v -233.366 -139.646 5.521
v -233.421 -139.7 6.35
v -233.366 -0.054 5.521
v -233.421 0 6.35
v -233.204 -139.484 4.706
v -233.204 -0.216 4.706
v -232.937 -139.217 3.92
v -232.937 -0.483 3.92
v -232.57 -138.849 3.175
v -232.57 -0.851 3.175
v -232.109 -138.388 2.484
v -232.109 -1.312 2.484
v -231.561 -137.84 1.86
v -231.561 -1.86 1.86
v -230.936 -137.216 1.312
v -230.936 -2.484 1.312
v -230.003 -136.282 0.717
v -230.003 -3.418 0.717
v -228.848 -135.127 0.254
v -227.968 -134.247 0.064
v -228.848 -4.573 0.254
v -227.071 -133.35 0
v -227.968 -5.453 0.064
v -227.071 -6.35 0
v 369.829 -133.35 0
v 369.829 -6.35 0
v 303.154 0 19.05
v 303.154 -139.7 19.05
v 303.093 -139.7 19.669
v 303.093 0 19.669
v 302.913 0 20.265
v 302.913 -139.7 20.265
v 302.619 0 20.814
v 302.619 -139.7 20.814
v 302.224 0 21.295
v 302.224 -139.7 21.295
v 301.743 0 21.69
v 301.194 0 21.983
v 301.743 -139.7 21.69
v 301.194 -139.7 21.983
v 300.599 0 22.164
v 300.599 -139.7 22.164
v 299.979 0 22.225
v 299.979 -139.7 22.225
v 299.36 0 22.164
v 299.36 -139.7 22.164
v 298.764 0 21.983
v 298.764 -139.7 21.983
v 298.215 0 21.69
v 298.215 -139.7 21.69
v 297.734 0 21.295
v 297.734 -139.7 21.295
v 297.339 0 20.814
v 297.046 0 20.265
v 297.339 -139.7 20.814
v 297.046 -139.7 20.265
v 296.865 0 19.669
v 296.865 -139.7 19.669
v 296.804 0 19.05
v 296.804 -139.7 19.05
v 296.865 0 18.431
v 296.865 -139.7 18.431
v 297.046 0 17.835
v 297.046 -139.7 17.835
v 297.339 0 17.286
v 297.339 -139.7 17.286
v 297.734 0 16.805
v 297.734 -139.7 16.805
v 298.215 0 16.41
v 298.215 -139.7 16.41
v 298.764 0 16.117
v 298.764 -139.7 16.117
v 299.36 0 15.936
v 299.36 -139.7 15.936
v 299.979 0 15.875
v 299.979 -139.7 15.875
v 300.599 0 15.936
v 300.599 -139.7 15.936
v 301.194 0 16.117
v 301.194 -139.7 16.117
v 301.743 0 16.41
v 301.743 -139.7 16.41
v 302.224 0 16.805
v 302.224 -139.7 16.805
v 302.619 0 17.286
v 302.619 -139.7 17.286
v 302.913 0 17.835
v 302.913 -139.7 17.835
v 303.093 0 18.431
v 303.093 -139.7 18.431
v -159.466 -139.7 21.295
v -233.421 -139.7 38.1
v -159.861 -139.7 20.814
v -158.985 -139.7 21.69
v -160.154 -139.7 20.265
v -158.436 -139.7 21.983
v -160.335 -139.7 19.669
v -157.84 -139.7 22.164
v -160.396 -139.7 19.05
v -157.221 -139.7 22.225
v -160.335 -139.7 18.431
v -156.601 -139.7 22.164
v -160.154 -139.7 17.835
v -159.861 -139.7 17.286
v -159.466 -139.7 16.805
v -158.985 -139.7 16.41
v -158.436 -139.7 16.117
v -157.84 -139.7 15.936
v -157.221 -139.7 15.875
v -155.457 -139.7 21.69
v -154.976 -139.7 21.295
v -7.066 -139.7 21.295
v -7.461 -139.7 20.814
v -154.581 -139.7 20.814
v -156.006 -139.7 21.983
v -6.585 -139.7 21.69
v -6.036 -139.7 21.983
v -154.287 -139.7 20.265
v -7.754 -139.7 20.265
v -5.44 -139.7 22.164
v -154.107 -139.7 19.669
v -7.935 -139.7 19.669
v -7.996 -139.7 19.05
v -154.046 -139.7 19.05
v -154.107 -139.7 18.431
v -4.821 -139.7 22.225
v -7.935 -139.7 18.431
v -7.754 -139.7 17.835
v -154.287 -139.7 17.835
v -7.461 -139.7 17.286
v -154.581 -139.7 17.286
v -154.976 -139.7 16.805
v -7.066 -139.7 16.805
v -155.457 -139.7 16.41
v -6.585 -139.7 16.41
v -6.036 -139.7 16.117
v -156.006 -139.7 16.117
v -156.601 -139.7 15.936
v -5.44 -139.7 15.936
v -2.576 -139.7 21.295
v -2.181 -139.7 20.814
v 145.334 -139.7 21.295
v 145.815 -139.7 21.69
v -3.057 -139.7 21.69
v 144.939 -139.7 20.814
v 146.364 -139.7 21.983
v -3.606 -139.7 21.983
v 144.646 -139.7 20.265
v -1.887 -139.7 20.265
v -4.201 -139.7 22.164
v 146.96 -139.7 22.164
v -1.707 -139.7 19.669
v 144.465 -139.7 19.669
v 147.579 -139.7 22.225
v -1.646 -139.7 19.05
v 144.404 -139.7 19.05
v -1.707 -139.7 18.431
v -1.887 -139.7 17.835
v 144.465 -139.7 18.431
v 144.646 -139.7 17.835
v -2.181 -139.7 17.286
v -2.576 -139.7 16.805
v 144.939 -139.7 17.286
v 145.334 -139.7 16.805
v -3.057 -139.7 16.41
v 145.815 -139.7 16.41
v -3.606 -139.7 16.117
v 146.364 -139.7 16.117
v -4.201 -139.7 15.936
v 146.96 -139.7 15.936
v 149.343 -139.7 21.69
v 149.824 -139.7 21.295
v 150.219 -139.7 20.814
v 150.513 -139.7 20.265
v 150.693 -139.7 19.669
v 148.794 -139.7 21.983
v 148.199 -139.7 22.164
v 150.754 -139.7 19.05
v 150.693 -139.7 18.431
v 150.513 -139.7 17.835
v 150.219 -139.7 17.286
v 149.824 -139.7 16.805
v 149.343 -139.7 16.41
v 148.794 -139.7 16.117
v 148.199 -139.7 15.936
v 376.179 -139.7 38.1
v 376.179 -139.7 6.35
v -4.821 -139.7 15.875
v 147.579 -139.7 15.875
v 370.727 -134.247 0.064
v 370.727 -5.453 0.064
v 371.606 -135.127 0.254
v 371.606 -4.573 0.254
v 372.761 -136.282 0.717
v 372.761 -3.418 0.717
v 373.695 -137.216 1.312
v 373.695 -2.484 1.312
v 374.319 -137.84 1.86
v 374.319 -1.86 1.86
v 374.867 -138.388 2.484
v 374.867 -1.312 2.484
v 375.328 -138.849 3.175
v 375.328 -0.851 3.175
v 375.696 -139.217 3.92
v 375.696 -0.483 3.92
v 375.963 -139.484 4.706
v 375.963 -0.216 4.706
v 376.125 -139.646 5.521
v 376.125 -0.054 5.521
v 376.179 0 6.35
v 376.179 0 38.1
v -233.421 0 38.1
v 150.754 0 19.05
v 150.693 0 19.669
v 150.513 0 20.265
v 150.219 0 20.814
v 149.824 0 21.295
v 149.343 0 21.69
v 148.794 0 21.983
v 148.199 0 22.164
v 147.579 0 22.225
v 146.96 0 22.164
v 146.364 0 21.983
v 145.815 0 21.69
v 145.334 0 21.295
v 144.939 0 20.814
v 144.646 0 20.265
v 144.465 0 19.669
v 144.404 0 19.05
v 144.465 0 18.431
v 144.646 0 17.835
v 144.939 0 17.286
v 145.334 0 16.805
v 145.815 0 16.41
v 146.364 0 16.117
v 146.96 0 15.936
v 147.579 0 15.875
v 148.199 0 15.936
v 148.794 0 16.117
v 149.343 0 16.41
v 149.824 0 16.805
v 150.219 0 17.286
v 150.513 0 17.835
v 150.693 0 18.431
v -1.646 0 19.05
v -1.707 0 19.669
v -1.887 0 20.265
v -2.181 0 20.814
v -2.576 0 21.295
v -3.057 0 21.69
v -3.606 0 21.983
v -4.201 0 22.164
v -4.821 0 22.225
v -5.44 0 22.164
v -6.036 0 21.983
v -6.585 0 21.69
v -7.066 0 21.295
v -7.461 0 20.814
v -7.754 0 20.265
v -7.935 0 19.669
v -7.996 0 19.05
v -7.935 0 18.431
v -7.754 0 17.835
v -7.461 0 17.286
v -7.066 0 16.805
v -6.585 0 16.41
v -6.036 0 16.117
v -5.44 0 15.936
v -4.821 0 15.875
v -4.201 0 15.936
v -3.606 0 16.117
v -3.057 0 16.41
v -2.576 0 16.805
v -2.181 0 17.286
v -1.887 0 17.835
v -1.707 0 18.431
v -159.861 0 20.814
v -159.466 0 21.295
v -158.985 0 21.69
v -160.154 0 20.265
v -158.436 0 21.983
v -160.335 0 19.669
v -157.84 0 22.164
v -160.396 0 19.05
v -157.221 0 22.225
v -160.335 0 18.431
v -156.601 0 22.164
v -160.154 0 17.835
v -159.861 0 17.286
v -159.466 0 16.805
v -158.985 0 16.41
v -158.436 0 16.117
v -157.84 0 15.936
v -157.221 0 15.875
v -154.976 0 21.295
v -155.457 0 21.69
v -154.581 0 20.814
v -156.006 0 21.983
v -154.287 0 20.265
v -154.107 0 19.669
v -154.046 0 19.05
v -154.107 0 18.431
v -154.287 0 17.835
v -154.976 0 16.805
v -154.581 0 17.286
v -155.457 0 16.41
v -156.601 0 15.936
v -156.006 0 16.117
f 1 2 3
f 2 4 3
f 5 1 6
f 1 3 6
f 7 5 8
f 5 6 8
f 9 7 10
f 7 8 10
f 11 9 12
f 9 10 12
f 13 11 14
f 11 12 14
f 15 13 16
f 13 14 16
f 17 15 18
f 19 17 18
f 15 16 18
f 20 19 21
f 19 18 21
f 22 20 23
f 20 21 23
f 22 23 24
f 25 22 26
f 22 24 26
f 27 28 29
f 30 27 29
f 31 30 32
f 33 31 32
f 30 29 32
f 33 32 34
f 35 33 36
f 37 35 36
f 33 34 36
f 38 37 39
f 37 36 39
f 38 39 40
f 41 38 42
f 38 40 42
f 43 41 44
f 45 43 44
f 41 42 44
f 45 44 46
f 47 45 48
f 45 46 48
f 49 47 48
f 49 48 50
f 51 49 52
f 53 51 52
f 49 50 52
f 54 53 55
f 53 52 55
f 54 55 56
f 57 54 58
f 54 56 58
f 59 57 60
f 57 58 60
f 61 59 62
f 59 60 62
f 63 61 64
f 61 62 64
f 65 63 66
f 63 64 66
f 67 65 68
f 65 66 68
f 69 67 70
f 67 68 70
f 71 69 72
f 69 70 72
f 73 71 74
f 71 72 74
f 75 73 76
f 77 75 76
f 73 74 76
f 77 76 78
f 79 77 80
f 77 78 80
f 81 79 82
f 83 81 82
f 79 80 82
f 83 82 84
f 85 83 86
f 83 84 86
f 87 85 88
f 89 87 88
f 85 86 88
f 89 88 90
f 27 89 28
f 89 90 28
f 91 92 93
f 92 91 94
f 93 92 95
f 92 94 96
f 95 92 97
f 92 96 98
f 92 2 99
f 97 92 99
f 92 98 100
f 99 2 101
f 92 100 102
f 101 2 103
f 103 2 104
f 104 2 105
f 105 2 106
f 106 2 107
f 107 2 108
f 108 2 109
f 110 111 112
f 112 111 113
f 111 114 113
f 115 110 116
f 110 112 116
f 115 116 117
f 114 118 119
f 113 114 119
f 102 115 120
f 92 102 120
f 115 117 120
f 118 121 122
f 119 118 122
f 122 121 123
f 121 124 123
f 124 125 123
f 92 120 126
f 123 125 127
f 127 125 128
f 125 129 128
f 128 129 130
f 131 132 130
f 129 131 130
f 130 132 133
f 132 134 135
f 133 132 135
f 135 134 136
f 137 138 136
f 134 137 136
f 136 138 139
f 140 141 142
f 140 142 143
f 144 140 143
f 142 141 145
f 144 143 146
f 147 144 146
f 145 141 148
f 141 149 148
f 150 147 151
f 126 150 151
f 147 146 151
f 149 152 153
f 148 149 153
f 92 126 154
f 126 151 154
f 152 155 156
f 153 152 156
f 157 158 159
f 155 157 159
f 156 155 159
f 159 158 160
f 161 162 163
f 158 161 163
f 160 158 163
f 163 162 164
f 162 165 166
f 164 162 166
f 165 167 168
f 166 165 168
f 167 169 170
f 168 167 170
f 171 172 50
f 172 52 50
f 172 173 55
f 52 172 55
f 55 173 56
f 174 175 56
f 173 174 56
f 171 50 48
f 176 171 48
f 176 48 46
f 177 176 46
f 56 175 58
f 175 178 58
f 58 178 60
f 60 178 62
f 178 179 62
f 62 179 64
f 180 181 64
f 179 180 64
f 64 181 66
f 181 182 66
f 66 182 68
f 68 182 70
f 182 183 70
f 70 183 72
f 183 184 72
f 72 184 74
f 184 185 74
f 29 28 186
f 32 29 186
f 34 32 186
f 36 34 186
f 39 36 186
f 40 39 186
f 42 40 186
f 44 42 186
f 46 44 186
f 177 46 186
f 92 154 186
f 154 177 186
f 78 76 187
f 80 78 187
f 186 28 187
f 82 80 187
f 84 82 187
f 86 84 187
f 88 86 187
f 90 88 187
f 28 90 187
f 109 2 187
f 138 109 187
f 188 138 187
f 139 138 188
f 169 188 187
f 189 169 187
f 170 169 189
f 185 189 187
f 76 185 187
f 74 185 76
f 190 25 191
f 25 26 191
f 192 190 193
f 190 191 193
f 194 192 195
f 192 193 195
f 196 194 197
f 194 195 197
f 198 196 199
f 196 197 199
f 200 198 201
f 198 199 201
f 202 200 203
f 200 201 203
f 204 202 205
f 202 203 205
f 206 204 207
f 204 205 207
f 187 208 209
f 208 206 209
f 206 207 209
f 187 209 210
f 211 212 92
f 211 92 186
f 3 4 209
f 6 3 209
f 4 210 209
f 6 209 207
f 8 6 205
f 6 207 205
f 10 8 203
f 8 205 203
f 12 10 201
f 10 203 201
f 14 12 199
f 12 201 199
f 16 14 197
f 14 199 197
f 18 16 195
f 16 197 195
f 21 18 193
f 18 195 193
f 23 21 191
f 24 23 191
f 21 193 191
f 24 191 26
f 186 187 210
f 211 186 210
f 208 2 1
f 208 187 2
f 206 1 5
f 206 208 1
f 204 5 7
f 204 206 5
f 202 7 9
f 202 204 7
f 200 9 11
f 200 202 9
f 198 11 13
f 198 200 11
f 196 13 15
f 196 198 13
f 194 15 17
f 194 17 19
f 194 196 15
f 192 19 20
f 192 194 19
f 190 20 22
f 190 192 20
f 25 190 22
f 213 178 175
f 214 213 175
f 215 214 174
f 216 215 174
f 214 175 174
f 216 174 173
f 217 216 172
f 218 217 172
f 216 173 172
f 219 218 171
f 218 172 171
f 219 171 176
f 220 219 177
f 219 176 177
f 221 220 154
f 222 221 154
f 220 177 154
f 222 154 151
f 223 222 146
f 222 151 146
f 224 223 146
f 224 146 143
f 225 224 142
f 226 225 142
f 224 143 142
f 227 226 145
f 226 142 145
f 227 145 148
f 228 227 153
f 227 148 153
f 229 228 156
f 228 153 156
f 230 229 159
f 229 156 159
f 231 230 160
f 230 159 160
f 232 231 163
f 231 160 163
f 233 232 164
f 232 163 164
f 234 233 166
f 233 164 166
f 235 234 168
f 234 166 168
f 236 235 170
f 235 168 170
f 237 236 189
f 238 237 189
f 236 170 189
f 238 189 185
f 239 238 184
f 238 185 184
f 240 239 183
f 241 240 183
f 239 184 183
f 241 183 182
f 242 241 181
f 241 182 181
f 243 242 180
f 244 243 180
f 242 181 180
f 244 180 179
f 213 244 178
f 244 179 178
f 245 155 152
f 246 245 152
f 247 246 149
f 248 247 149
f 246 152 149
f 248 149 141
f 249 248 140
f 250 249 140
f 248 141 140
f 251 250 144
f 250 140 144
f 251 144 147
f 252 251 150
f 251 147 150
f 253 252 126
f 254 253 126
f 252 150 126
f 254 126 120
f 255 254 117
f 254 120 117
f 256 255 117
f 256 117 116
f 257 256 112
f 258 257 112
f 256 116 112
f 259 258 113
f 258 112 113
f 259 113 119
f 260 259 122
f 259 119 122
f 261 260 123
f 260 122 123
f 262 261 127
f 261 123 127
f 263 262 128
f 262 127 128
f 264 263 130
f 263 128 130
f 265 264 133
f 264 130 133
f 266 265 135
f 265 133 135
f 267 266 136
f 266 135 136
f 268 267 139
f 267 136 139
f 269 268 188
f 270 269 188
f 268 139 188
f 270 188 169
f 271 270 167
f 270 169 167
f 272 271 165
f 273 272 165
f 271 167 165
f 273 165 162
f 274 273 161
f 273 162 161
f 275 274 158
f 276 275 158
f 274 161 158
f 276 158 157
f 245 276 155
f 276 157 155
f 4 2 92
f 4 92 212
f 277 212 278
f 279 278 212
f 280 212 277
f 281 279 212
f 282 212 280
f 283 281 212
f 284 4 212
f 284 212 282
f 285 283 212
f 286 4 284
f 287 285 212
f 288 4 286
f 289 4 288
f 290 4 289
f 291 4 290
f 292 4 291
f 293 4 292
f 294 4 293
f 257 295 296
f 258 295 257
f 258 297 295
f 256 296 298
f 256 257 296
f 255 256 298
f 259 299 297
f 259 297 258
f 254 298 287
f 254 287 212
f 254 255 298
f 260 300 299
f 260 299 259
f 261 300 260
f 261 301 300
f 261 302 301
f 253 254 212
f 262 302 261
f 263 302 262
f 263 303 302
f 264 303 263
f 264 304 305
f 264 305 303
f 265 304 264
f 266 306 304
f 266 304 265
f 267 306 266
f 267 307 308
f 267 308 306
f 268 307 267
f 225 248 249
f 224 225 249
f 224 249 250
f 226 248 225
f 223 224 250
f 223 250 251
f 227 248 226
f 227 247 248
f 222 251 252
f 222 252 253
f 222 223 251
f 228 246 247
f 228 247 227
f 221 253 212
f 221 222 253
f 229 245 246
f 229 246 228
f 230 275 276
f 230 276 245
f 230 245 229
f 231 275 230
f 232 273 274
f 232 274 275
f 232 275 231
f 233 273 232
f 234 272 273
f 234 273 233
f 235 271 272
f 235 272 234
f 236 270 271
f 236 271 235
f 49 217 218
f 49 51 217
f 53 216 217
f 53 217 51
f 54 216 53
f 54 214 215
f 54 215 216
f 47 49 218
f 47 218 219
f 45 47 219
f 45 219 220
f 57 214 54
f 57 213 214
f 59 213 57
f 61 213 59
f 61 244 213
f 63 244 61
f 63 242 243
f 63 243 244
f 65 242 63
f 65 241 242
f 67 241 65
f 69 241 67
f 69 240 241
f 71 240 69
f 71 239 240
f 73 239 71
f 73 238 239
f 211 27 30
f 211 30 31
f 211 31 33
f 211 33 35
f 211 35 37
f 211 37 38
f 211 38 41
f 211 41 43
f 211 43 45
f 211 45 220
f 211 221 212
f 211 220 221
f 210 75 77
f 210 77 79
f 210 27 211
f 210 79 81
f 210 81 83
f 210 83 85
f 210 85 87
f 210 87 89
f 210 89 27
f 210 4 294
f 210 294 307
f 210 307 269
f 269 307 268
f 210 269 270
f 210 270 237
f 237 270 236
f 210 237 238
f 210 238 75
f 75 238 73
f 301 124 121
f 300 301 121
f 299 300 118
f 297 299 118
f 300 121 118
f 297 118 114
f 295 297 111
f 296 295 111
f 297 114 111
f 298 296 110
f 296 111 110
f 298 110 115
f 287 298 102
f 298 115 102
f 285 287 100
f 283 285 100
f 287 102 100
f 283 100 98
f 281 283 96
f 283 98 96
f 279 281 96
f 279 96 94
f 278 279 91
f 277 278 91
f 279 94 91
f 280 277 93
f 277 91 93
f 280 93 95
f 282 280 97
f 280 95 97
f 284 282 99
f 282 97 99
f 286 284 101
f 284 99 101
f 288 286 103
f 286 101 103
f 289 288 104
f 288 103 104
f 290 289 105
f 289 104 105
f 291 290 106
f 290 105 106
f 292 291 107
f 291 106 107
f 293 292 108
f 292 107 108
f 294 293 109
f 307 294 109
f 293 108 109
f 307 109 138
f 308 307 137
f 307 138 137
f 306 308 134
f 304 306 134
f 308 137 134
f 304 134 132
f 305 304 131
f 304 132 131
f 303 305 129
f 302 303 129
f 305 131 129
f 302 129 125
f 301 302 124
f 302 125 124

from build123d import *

# Parameters (mm, degrees)
F3_W     = 609.6
F3_H     = 139.7
F0_DEPTH = 38.1
F1_R     = 3.175
F4_DEPTH = 139.7
F2_R     = 6.35


with BuildPart() as f0:
    # F3 (on Top) → F0 (new body)
    with BuildSketch(Plane.XY):
        with Locations((71.379216, -69.85)):
            Rectangle(F3_W, F3_H)
    extrude(amount=F0_DEPTH)

    # F1 (on face) → F4 (cut)
    with BuildSketch(Plane.XZ.offset(139.7)):
        with Locations((-157.220784, 19.05)):
            Circle(F1_R)
        with Locations((-4.820784, 19.05)):
            Circle(F1_R)
        with Locations((147.579216, 19.05)):
            Circle(F1_R)
        with Locations((299.979216, 19.05)):
            Circle(F1_R)
    extrude(amount=-F4_DEPTH, mode=Mode.SUBTRACT)

    # F2
    f2_edges = [f0.edges().sort_by_distance(p)[0] for p in [
        (71.379216, -139.7, 0),
        (71.379216, 0, 0),
        (-233.420784, -69.85, 0),
        (376.179216, -69.85, 0),
    ]]
    fillet(f2_edges, radius=F2_R)


solid = f0.part
